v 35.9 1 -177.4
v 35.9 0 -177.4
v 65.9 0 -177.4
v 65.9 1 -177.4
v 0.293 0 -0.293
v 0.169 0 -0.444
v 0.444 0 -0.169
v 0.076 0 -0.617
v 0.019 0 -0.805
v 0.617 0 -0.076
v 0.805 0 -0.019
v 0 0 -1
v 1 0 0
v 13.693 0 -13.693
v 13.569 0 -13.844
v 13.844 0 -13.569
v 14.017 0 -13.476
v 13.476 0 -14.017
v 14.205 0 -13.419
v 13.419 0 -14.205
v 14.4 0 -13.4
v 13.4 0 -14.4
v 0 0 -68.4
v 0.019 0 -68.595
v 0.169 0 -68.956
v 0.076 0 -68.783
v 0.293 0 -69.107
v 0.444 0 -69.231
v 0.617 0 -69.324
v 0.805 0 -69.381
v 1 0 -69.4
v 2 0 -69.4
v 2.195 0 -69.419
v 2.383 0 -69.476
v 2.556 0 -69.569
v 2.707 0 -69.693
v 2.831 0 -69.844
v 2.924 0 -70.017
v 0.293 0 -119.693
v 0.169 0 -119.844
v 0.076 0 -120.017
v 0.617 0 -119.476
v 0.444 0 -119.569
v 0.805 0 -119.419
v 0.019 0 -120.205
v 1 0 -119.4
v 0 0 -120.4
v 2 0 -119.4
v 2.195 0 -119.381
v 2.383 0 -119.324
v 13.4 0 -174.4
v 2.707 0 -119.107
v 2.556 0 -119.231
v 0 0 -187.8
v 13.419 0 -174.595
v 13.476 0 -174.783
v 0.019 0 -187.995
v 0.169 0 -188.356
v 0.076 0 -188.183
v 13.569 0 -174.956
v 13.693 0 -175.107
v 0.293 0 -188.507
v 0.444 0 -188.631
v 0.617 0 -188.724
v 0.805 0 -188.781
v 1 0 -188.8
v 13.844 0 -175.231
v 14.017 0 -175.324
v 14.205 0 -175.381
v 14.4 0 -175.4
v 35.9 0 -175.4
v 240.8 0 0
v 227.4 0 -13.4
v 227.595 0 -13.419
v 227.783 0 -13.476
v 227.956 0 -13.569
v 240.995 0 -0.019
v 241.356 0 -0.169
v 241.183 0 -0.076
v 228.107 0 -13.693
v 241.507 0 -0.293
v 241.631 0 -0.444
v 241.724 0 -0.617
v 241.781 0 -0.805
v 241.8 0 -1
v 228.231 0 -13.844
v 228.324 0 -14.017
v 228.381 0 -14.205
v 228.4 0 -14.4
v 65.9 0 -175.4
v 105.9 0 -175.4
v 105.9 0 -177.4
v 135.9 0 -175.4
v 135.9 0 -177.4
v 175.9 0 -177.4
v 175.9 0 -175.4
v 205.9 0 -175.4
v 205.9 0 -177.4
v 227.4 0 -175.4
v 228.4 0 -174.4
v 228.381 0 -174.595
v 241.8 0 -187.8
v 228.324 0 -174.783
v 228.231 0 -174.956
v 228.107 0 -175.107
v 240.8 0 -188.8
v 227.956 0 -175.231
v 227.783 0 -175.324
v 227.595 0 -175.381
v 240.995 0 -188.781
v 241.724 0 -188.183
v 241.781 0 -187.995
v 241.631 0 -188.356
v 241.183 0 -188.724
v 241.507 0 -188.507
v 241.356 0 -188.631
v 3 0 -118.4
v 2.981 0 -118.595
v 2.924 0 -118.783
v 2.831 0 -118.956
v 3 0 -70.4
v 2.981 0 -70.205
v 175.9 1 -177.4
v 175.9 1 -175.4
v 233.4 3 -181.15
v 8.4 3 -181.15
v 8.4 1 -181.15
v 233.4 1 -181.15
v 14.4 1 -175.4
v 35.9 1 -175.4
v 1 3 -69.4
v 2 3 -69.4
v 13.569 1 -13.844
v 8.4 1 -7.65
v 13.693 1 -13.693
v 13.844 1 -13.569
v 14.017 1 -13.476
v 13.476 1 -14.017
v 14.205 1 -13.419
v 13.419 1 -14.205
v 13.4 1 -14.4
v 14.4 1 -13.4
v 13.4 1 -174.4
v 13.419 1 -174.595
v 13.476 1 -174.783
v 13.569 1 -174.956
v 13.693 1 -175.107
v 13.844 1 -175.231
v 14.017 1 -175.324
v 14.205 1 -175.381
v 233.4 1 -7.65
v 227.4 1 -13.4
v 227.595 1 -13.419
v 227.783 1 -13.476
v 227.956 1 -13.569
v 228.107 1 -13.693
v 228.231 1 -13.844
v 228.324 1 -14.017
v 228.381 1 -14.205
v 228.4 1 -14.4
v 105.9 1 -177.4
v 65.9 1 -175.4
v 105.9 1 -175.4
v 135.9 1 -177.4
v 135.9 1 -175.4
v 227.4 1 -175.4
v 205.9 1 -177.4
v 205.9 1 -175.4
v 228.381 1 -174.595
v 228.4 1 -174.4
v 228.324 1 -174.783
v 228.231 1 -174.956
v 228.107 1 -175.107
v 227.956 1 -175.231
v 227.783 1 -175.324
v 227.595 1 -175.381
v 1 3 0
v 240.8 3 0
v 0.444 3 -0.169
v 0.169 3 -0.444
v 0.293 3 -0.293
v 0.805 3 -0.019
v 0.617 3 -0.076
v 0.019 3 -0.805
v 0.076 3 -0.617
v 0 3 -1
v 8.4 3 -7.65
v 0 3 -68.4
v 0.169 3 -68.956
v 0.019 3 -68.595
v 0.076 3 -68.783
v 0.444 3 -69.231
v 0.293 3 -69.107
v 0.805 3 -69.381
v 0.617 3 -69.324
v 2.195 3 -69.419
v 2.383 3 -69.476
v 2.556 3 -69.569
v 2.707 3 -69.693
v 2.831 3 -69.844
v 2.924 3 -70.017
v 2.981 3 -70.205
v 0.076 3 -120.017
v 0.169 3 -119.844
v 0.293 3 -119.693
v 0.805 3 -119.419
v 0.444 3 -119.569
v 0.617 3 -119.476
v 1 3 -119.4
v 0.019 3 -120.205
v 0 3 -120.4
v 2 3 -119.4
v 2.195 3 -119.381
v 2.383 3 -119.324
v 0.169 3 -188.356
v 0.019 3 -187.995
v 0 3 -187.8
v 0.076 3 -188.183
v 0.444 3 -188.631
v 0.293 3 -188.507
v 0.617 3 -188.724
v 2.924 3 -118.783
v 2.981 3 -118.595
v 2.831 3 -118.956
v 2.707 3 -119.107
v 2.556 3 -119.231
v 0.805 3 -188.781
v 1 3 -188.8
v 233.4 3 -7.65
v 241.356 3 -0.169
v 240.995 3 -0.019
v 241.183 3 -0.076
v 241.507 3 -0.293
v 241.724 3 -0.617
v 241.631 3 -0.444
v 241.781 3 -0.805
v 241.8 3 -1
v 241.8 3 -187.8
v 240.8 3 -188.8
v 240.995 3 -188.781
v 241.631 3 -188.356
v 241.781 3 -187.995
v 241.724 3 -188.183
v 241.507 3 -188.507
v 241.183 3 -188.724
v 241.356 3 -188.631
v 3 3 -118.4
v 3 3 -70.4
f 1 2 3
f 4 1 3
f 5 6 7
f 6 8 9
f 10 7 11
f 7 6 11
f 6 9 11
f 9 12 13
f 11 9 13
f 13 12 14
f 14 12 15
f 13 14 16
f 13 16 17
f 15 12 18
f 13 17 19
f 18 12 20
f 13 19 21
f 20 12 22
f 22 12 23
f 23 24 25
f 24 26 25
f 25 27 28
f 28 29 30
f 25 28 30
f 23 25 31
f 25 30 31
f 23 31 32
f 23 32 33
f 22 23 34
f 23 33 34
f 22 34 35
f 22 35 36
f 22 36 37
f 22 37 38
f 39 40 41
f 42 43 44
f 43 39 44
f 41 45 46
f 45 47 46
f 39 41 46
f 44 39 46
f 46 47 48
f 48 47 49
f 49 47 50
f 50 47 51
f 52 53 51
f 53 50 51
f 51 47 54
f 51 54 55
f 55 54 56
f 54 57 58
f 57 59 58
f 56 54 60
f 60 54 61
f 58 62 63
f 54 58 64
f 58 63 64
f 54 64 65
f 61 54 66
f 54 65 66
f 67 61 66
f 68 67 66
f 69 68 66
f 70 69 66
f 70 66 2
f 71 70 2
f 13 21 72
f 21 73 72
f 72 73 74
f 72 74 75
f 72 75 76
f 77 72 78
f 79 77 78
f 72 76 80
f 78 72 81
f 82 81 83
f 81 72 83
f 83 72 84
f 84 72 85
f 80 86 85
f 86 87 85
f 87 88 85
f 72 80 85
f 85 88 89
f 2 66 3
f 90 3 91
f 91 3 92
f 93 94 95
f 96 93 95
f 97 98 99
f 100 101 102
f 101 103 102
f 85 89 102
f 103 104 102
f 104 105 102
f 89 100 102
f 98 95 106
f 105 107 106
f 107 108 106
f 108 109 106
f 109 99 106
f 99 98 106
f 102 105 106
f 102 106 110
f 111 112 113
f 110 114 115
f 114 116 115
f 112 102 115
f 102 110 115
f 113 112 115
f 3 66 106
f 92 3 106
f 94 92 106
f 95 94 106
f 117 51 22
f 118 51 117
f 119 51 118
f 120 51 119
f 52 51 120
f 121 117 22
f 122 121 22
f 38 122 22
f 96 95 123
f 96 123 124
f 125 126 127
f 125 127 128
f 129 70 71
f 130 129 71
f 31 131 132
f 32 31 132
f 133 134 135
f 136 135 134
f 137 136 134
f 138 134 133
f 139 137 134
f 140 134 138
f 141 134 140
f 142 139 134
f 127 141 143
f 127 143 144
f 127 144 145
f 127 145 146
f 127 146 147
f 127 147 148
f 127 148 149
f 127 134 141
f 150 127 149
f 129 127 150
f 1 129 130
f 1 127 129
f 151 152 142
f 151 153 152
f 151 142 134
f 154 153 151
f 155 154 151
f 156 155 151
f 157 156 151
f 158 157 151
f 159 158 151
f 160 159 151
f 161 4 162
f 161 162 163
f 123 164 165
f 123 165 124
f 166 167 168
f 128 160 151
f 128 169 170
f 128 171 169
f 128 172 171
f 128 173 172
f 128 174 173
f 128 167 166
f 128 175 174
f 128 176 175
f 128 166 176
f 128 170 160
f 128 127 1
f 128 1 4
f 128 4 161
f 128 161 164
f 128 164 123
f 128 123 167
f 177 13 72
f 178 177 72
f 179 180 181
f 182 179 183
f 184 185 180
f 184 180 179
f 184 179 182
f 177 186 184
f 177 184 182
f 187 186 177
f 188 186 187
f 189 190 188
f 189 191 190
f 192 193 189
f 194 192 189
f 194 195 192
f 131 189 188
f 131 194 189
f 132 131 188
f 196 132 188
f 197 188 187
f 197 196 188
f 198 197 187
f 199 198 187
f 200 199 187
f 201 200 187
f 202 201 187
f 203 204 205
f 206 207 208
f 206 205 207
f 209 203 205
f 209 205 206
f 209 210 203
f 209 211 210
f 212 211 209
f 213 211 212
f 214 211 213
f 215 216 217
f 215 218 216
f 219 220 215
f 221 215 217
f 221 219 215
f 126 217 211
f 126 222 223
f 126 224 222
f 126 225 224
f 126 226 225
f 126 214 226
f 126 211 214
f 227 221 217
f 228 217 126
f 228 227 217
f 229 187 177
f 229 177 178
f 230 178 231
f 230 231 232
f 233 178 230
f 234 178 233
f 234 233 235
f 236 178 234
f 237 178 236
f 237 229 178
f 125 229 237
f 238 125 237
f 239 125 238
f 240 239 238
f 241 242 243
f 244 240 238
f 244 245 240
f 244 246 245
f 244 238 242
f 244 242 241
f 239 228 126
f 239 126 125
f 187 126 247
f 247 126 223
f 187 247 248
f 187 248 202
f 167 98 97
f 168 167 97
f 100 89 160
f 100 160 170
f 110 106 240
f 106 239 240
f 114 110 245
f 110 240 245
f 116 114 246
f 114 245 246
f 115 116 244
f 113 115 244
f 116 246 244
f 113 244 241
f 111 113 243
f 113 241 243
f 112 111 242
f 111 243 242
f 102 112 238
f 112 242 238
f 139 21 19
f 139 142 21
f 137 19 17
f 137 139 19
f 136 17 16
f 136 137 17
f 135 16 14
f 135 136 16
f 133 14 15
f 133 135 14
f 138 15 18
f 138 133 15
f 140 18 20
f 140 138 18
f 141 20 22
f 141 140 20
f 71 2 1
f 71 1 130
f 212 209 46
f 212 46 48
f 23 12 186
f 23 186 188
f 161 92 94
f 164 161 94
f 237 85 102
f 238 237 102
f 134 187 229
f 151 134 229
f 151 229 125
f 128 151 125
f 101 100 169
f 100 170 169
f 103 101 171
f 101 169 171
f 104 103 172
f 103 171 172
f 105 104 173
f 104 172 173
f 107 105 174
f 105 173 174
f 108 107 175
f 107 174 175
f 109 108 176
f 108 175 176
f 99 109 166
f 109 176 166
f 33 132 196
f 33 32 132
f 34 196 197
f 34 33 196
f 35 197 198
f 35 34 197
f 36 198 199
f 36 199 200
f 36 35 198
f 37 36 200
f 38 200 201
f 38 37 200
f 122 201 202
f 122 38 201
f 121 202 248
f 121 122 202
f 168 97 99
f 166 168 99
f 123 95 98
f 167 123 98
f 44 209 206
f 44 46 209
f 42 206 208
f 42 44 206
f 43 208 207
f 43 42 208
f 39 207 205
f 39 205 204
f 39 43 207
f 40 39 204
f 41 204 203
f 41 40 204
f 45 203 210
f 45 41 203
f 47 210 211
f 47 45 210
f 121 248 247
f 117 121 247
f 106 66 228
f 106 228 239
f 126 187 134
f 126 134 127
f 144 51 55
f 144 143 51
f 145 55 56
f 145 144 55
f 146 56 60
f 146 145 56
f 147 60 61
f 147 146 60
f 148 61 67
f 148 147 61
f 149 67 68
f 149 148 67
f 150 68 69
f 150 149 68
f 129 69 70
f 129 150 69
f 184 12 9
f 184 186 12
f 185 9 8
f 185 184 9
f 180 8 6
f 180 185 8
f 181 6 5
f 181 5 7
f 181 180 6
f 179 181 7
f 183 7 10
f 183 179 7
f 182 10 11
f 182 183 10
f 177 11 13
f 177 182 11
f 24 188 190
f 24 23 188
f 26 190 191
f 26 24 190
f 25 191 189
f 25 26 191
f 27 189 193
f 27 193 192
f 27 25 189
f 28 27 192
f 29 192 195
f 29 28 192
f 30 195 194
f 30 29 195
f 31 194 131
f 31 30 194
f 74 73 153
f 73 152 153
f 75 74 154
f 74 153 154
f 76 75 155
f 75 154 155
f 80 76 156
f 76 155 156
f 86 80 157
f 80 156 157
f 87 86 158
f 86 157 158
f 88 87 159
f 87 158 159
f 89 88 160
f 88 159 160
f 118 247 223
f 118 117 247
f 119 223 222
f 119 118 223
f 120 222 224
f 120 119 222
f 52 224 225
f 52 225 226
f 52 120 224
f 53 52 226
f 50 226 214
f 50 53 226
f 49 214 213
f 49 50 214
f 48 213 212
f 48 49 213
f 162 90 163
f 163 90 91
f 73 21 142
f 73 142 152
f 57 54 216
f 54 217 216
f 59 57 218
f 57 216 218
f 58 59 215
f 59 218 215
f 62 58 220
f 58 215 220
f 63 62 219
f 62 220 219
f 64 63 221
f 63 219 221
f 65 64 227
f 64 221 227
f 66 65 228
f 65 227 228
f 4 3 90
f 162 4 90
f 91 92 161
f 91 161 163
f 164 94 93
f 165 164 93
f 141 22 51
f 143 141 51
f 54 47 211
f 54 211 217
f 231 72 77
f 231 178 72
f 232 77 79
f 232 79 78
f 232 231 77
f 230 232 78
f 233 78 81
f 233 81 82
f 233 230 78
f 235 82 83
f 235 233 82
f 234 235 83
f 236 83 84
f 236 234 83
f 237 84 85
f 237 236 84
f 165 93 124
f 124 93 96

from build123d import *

# Parameters (mm, degrees)
SKETCH1_W           = 241.8
SKETCH1_H           = 188.8
SKETCH1_W_2         = 215
SKETCH1_H_2         = 162
BOSS_EXTRUDE1_DEPTH = 3
SKETCH2_W           = 225
SKETCH2_H           = 173.5
CUT_EXTRUDE1_DEPTH  = 2
SKETCH3_W           = 3
SKETCH3_H           = 50
CUT_EXTRUDE2_DEPTH  = 5
FILLET1_R           = 1
SKETCH4_W           = 30
SKETCH4_H           = 2
CUT_EXTRUDE3_DEPTH  = 4


with BuildPart() as part:
    # Sketch1 → Boss-Extrude1 (new body)
    with BuildSketch(Plane(origin=(0, 0, 0), x_dir=(1, 0, 0), z_dir=(0, 1, 0))):
        with Locations((120.9, 94.4)):
            Rectangle(SKETCH1_W, SKETCH1_H)
        with Locations((120.9, 94.4)):
            Rectangle(SKETCH1_W_2, SKETCH1_H_2, mode=Mode.SUBTRACT)
    extrude(amount=BOSS_EXTRUDE1_DEPTH)

    # Sketch2 → Cut-Extrude1 (cut)
    with BuildSketch(Plane(origin=(0, 3, 0), x_dir=(1, 0, 0), z_dir=(0, 1, 0))):
        with Locations((120.9, 94.4)):
            Rectangle(SKETCH2_W, SKETCH2_H)
    extrude(amount=-CUT_EXTRUDE1_DEPTH, mode=Mode.SUBTRACT)

    # Sketch3 → Cut-Extrude2 (cut)
    with BuildSketch(Plane(origin=(0, 3, 0), x_dir=(1, 0, 0), z_dir=(0, 1, 0))):
        with Locations((1.5, 94.4)):
            Rectangle(SKETCH3_W, SKETCH3_H)
    extrude(amount=-CUT_EXTRUDE2_DEPTH, mode=Mode.SUBTRACT)

    # Fillet1
    fillet1_edges = [part.edges().sort_by_distance(p)[0] for p in [
        (228.4, 0.5, -175.4),
        (13.4, 0.5, -175.4),
        (228.4, 0.5, -13.4),
        (13.4, 0.5, -13.4),
        (0, 1.5, -69.4),
        (0, 1.5, -119.4),
        (3, 1.5, -119.4),
        (3, 1.5, -69.4),
        (0, 1.5, -188.8),
        (241.8, 1.5, -188.8),
        (241.8, 1.5, 0),
        (0, 1.5, 0),
    ]]
    fillet(fillet1_edges, radius=FILLET1_R)

    # Sketch4 → Cut-Extrude3 (cut, through all)
    with BuildSketch(Plane.XZ):
        with Locations((50.9, -176.4)):
            Rectangle(SKETCH4_W, SKETCH4_H)
        with Locations((120.9, -176.4)):
            Rectangle(SKETCH4_W, SKETCH4_H)
        with Locations((190.9, -176.4)):
            Rectangle(SKETCH4_W, SKETCH4_H)
    extrude(amount=-CUT_EXTRUDE3_DEPTH, mode=Mode.SUBTRACT)


solid = part.part
